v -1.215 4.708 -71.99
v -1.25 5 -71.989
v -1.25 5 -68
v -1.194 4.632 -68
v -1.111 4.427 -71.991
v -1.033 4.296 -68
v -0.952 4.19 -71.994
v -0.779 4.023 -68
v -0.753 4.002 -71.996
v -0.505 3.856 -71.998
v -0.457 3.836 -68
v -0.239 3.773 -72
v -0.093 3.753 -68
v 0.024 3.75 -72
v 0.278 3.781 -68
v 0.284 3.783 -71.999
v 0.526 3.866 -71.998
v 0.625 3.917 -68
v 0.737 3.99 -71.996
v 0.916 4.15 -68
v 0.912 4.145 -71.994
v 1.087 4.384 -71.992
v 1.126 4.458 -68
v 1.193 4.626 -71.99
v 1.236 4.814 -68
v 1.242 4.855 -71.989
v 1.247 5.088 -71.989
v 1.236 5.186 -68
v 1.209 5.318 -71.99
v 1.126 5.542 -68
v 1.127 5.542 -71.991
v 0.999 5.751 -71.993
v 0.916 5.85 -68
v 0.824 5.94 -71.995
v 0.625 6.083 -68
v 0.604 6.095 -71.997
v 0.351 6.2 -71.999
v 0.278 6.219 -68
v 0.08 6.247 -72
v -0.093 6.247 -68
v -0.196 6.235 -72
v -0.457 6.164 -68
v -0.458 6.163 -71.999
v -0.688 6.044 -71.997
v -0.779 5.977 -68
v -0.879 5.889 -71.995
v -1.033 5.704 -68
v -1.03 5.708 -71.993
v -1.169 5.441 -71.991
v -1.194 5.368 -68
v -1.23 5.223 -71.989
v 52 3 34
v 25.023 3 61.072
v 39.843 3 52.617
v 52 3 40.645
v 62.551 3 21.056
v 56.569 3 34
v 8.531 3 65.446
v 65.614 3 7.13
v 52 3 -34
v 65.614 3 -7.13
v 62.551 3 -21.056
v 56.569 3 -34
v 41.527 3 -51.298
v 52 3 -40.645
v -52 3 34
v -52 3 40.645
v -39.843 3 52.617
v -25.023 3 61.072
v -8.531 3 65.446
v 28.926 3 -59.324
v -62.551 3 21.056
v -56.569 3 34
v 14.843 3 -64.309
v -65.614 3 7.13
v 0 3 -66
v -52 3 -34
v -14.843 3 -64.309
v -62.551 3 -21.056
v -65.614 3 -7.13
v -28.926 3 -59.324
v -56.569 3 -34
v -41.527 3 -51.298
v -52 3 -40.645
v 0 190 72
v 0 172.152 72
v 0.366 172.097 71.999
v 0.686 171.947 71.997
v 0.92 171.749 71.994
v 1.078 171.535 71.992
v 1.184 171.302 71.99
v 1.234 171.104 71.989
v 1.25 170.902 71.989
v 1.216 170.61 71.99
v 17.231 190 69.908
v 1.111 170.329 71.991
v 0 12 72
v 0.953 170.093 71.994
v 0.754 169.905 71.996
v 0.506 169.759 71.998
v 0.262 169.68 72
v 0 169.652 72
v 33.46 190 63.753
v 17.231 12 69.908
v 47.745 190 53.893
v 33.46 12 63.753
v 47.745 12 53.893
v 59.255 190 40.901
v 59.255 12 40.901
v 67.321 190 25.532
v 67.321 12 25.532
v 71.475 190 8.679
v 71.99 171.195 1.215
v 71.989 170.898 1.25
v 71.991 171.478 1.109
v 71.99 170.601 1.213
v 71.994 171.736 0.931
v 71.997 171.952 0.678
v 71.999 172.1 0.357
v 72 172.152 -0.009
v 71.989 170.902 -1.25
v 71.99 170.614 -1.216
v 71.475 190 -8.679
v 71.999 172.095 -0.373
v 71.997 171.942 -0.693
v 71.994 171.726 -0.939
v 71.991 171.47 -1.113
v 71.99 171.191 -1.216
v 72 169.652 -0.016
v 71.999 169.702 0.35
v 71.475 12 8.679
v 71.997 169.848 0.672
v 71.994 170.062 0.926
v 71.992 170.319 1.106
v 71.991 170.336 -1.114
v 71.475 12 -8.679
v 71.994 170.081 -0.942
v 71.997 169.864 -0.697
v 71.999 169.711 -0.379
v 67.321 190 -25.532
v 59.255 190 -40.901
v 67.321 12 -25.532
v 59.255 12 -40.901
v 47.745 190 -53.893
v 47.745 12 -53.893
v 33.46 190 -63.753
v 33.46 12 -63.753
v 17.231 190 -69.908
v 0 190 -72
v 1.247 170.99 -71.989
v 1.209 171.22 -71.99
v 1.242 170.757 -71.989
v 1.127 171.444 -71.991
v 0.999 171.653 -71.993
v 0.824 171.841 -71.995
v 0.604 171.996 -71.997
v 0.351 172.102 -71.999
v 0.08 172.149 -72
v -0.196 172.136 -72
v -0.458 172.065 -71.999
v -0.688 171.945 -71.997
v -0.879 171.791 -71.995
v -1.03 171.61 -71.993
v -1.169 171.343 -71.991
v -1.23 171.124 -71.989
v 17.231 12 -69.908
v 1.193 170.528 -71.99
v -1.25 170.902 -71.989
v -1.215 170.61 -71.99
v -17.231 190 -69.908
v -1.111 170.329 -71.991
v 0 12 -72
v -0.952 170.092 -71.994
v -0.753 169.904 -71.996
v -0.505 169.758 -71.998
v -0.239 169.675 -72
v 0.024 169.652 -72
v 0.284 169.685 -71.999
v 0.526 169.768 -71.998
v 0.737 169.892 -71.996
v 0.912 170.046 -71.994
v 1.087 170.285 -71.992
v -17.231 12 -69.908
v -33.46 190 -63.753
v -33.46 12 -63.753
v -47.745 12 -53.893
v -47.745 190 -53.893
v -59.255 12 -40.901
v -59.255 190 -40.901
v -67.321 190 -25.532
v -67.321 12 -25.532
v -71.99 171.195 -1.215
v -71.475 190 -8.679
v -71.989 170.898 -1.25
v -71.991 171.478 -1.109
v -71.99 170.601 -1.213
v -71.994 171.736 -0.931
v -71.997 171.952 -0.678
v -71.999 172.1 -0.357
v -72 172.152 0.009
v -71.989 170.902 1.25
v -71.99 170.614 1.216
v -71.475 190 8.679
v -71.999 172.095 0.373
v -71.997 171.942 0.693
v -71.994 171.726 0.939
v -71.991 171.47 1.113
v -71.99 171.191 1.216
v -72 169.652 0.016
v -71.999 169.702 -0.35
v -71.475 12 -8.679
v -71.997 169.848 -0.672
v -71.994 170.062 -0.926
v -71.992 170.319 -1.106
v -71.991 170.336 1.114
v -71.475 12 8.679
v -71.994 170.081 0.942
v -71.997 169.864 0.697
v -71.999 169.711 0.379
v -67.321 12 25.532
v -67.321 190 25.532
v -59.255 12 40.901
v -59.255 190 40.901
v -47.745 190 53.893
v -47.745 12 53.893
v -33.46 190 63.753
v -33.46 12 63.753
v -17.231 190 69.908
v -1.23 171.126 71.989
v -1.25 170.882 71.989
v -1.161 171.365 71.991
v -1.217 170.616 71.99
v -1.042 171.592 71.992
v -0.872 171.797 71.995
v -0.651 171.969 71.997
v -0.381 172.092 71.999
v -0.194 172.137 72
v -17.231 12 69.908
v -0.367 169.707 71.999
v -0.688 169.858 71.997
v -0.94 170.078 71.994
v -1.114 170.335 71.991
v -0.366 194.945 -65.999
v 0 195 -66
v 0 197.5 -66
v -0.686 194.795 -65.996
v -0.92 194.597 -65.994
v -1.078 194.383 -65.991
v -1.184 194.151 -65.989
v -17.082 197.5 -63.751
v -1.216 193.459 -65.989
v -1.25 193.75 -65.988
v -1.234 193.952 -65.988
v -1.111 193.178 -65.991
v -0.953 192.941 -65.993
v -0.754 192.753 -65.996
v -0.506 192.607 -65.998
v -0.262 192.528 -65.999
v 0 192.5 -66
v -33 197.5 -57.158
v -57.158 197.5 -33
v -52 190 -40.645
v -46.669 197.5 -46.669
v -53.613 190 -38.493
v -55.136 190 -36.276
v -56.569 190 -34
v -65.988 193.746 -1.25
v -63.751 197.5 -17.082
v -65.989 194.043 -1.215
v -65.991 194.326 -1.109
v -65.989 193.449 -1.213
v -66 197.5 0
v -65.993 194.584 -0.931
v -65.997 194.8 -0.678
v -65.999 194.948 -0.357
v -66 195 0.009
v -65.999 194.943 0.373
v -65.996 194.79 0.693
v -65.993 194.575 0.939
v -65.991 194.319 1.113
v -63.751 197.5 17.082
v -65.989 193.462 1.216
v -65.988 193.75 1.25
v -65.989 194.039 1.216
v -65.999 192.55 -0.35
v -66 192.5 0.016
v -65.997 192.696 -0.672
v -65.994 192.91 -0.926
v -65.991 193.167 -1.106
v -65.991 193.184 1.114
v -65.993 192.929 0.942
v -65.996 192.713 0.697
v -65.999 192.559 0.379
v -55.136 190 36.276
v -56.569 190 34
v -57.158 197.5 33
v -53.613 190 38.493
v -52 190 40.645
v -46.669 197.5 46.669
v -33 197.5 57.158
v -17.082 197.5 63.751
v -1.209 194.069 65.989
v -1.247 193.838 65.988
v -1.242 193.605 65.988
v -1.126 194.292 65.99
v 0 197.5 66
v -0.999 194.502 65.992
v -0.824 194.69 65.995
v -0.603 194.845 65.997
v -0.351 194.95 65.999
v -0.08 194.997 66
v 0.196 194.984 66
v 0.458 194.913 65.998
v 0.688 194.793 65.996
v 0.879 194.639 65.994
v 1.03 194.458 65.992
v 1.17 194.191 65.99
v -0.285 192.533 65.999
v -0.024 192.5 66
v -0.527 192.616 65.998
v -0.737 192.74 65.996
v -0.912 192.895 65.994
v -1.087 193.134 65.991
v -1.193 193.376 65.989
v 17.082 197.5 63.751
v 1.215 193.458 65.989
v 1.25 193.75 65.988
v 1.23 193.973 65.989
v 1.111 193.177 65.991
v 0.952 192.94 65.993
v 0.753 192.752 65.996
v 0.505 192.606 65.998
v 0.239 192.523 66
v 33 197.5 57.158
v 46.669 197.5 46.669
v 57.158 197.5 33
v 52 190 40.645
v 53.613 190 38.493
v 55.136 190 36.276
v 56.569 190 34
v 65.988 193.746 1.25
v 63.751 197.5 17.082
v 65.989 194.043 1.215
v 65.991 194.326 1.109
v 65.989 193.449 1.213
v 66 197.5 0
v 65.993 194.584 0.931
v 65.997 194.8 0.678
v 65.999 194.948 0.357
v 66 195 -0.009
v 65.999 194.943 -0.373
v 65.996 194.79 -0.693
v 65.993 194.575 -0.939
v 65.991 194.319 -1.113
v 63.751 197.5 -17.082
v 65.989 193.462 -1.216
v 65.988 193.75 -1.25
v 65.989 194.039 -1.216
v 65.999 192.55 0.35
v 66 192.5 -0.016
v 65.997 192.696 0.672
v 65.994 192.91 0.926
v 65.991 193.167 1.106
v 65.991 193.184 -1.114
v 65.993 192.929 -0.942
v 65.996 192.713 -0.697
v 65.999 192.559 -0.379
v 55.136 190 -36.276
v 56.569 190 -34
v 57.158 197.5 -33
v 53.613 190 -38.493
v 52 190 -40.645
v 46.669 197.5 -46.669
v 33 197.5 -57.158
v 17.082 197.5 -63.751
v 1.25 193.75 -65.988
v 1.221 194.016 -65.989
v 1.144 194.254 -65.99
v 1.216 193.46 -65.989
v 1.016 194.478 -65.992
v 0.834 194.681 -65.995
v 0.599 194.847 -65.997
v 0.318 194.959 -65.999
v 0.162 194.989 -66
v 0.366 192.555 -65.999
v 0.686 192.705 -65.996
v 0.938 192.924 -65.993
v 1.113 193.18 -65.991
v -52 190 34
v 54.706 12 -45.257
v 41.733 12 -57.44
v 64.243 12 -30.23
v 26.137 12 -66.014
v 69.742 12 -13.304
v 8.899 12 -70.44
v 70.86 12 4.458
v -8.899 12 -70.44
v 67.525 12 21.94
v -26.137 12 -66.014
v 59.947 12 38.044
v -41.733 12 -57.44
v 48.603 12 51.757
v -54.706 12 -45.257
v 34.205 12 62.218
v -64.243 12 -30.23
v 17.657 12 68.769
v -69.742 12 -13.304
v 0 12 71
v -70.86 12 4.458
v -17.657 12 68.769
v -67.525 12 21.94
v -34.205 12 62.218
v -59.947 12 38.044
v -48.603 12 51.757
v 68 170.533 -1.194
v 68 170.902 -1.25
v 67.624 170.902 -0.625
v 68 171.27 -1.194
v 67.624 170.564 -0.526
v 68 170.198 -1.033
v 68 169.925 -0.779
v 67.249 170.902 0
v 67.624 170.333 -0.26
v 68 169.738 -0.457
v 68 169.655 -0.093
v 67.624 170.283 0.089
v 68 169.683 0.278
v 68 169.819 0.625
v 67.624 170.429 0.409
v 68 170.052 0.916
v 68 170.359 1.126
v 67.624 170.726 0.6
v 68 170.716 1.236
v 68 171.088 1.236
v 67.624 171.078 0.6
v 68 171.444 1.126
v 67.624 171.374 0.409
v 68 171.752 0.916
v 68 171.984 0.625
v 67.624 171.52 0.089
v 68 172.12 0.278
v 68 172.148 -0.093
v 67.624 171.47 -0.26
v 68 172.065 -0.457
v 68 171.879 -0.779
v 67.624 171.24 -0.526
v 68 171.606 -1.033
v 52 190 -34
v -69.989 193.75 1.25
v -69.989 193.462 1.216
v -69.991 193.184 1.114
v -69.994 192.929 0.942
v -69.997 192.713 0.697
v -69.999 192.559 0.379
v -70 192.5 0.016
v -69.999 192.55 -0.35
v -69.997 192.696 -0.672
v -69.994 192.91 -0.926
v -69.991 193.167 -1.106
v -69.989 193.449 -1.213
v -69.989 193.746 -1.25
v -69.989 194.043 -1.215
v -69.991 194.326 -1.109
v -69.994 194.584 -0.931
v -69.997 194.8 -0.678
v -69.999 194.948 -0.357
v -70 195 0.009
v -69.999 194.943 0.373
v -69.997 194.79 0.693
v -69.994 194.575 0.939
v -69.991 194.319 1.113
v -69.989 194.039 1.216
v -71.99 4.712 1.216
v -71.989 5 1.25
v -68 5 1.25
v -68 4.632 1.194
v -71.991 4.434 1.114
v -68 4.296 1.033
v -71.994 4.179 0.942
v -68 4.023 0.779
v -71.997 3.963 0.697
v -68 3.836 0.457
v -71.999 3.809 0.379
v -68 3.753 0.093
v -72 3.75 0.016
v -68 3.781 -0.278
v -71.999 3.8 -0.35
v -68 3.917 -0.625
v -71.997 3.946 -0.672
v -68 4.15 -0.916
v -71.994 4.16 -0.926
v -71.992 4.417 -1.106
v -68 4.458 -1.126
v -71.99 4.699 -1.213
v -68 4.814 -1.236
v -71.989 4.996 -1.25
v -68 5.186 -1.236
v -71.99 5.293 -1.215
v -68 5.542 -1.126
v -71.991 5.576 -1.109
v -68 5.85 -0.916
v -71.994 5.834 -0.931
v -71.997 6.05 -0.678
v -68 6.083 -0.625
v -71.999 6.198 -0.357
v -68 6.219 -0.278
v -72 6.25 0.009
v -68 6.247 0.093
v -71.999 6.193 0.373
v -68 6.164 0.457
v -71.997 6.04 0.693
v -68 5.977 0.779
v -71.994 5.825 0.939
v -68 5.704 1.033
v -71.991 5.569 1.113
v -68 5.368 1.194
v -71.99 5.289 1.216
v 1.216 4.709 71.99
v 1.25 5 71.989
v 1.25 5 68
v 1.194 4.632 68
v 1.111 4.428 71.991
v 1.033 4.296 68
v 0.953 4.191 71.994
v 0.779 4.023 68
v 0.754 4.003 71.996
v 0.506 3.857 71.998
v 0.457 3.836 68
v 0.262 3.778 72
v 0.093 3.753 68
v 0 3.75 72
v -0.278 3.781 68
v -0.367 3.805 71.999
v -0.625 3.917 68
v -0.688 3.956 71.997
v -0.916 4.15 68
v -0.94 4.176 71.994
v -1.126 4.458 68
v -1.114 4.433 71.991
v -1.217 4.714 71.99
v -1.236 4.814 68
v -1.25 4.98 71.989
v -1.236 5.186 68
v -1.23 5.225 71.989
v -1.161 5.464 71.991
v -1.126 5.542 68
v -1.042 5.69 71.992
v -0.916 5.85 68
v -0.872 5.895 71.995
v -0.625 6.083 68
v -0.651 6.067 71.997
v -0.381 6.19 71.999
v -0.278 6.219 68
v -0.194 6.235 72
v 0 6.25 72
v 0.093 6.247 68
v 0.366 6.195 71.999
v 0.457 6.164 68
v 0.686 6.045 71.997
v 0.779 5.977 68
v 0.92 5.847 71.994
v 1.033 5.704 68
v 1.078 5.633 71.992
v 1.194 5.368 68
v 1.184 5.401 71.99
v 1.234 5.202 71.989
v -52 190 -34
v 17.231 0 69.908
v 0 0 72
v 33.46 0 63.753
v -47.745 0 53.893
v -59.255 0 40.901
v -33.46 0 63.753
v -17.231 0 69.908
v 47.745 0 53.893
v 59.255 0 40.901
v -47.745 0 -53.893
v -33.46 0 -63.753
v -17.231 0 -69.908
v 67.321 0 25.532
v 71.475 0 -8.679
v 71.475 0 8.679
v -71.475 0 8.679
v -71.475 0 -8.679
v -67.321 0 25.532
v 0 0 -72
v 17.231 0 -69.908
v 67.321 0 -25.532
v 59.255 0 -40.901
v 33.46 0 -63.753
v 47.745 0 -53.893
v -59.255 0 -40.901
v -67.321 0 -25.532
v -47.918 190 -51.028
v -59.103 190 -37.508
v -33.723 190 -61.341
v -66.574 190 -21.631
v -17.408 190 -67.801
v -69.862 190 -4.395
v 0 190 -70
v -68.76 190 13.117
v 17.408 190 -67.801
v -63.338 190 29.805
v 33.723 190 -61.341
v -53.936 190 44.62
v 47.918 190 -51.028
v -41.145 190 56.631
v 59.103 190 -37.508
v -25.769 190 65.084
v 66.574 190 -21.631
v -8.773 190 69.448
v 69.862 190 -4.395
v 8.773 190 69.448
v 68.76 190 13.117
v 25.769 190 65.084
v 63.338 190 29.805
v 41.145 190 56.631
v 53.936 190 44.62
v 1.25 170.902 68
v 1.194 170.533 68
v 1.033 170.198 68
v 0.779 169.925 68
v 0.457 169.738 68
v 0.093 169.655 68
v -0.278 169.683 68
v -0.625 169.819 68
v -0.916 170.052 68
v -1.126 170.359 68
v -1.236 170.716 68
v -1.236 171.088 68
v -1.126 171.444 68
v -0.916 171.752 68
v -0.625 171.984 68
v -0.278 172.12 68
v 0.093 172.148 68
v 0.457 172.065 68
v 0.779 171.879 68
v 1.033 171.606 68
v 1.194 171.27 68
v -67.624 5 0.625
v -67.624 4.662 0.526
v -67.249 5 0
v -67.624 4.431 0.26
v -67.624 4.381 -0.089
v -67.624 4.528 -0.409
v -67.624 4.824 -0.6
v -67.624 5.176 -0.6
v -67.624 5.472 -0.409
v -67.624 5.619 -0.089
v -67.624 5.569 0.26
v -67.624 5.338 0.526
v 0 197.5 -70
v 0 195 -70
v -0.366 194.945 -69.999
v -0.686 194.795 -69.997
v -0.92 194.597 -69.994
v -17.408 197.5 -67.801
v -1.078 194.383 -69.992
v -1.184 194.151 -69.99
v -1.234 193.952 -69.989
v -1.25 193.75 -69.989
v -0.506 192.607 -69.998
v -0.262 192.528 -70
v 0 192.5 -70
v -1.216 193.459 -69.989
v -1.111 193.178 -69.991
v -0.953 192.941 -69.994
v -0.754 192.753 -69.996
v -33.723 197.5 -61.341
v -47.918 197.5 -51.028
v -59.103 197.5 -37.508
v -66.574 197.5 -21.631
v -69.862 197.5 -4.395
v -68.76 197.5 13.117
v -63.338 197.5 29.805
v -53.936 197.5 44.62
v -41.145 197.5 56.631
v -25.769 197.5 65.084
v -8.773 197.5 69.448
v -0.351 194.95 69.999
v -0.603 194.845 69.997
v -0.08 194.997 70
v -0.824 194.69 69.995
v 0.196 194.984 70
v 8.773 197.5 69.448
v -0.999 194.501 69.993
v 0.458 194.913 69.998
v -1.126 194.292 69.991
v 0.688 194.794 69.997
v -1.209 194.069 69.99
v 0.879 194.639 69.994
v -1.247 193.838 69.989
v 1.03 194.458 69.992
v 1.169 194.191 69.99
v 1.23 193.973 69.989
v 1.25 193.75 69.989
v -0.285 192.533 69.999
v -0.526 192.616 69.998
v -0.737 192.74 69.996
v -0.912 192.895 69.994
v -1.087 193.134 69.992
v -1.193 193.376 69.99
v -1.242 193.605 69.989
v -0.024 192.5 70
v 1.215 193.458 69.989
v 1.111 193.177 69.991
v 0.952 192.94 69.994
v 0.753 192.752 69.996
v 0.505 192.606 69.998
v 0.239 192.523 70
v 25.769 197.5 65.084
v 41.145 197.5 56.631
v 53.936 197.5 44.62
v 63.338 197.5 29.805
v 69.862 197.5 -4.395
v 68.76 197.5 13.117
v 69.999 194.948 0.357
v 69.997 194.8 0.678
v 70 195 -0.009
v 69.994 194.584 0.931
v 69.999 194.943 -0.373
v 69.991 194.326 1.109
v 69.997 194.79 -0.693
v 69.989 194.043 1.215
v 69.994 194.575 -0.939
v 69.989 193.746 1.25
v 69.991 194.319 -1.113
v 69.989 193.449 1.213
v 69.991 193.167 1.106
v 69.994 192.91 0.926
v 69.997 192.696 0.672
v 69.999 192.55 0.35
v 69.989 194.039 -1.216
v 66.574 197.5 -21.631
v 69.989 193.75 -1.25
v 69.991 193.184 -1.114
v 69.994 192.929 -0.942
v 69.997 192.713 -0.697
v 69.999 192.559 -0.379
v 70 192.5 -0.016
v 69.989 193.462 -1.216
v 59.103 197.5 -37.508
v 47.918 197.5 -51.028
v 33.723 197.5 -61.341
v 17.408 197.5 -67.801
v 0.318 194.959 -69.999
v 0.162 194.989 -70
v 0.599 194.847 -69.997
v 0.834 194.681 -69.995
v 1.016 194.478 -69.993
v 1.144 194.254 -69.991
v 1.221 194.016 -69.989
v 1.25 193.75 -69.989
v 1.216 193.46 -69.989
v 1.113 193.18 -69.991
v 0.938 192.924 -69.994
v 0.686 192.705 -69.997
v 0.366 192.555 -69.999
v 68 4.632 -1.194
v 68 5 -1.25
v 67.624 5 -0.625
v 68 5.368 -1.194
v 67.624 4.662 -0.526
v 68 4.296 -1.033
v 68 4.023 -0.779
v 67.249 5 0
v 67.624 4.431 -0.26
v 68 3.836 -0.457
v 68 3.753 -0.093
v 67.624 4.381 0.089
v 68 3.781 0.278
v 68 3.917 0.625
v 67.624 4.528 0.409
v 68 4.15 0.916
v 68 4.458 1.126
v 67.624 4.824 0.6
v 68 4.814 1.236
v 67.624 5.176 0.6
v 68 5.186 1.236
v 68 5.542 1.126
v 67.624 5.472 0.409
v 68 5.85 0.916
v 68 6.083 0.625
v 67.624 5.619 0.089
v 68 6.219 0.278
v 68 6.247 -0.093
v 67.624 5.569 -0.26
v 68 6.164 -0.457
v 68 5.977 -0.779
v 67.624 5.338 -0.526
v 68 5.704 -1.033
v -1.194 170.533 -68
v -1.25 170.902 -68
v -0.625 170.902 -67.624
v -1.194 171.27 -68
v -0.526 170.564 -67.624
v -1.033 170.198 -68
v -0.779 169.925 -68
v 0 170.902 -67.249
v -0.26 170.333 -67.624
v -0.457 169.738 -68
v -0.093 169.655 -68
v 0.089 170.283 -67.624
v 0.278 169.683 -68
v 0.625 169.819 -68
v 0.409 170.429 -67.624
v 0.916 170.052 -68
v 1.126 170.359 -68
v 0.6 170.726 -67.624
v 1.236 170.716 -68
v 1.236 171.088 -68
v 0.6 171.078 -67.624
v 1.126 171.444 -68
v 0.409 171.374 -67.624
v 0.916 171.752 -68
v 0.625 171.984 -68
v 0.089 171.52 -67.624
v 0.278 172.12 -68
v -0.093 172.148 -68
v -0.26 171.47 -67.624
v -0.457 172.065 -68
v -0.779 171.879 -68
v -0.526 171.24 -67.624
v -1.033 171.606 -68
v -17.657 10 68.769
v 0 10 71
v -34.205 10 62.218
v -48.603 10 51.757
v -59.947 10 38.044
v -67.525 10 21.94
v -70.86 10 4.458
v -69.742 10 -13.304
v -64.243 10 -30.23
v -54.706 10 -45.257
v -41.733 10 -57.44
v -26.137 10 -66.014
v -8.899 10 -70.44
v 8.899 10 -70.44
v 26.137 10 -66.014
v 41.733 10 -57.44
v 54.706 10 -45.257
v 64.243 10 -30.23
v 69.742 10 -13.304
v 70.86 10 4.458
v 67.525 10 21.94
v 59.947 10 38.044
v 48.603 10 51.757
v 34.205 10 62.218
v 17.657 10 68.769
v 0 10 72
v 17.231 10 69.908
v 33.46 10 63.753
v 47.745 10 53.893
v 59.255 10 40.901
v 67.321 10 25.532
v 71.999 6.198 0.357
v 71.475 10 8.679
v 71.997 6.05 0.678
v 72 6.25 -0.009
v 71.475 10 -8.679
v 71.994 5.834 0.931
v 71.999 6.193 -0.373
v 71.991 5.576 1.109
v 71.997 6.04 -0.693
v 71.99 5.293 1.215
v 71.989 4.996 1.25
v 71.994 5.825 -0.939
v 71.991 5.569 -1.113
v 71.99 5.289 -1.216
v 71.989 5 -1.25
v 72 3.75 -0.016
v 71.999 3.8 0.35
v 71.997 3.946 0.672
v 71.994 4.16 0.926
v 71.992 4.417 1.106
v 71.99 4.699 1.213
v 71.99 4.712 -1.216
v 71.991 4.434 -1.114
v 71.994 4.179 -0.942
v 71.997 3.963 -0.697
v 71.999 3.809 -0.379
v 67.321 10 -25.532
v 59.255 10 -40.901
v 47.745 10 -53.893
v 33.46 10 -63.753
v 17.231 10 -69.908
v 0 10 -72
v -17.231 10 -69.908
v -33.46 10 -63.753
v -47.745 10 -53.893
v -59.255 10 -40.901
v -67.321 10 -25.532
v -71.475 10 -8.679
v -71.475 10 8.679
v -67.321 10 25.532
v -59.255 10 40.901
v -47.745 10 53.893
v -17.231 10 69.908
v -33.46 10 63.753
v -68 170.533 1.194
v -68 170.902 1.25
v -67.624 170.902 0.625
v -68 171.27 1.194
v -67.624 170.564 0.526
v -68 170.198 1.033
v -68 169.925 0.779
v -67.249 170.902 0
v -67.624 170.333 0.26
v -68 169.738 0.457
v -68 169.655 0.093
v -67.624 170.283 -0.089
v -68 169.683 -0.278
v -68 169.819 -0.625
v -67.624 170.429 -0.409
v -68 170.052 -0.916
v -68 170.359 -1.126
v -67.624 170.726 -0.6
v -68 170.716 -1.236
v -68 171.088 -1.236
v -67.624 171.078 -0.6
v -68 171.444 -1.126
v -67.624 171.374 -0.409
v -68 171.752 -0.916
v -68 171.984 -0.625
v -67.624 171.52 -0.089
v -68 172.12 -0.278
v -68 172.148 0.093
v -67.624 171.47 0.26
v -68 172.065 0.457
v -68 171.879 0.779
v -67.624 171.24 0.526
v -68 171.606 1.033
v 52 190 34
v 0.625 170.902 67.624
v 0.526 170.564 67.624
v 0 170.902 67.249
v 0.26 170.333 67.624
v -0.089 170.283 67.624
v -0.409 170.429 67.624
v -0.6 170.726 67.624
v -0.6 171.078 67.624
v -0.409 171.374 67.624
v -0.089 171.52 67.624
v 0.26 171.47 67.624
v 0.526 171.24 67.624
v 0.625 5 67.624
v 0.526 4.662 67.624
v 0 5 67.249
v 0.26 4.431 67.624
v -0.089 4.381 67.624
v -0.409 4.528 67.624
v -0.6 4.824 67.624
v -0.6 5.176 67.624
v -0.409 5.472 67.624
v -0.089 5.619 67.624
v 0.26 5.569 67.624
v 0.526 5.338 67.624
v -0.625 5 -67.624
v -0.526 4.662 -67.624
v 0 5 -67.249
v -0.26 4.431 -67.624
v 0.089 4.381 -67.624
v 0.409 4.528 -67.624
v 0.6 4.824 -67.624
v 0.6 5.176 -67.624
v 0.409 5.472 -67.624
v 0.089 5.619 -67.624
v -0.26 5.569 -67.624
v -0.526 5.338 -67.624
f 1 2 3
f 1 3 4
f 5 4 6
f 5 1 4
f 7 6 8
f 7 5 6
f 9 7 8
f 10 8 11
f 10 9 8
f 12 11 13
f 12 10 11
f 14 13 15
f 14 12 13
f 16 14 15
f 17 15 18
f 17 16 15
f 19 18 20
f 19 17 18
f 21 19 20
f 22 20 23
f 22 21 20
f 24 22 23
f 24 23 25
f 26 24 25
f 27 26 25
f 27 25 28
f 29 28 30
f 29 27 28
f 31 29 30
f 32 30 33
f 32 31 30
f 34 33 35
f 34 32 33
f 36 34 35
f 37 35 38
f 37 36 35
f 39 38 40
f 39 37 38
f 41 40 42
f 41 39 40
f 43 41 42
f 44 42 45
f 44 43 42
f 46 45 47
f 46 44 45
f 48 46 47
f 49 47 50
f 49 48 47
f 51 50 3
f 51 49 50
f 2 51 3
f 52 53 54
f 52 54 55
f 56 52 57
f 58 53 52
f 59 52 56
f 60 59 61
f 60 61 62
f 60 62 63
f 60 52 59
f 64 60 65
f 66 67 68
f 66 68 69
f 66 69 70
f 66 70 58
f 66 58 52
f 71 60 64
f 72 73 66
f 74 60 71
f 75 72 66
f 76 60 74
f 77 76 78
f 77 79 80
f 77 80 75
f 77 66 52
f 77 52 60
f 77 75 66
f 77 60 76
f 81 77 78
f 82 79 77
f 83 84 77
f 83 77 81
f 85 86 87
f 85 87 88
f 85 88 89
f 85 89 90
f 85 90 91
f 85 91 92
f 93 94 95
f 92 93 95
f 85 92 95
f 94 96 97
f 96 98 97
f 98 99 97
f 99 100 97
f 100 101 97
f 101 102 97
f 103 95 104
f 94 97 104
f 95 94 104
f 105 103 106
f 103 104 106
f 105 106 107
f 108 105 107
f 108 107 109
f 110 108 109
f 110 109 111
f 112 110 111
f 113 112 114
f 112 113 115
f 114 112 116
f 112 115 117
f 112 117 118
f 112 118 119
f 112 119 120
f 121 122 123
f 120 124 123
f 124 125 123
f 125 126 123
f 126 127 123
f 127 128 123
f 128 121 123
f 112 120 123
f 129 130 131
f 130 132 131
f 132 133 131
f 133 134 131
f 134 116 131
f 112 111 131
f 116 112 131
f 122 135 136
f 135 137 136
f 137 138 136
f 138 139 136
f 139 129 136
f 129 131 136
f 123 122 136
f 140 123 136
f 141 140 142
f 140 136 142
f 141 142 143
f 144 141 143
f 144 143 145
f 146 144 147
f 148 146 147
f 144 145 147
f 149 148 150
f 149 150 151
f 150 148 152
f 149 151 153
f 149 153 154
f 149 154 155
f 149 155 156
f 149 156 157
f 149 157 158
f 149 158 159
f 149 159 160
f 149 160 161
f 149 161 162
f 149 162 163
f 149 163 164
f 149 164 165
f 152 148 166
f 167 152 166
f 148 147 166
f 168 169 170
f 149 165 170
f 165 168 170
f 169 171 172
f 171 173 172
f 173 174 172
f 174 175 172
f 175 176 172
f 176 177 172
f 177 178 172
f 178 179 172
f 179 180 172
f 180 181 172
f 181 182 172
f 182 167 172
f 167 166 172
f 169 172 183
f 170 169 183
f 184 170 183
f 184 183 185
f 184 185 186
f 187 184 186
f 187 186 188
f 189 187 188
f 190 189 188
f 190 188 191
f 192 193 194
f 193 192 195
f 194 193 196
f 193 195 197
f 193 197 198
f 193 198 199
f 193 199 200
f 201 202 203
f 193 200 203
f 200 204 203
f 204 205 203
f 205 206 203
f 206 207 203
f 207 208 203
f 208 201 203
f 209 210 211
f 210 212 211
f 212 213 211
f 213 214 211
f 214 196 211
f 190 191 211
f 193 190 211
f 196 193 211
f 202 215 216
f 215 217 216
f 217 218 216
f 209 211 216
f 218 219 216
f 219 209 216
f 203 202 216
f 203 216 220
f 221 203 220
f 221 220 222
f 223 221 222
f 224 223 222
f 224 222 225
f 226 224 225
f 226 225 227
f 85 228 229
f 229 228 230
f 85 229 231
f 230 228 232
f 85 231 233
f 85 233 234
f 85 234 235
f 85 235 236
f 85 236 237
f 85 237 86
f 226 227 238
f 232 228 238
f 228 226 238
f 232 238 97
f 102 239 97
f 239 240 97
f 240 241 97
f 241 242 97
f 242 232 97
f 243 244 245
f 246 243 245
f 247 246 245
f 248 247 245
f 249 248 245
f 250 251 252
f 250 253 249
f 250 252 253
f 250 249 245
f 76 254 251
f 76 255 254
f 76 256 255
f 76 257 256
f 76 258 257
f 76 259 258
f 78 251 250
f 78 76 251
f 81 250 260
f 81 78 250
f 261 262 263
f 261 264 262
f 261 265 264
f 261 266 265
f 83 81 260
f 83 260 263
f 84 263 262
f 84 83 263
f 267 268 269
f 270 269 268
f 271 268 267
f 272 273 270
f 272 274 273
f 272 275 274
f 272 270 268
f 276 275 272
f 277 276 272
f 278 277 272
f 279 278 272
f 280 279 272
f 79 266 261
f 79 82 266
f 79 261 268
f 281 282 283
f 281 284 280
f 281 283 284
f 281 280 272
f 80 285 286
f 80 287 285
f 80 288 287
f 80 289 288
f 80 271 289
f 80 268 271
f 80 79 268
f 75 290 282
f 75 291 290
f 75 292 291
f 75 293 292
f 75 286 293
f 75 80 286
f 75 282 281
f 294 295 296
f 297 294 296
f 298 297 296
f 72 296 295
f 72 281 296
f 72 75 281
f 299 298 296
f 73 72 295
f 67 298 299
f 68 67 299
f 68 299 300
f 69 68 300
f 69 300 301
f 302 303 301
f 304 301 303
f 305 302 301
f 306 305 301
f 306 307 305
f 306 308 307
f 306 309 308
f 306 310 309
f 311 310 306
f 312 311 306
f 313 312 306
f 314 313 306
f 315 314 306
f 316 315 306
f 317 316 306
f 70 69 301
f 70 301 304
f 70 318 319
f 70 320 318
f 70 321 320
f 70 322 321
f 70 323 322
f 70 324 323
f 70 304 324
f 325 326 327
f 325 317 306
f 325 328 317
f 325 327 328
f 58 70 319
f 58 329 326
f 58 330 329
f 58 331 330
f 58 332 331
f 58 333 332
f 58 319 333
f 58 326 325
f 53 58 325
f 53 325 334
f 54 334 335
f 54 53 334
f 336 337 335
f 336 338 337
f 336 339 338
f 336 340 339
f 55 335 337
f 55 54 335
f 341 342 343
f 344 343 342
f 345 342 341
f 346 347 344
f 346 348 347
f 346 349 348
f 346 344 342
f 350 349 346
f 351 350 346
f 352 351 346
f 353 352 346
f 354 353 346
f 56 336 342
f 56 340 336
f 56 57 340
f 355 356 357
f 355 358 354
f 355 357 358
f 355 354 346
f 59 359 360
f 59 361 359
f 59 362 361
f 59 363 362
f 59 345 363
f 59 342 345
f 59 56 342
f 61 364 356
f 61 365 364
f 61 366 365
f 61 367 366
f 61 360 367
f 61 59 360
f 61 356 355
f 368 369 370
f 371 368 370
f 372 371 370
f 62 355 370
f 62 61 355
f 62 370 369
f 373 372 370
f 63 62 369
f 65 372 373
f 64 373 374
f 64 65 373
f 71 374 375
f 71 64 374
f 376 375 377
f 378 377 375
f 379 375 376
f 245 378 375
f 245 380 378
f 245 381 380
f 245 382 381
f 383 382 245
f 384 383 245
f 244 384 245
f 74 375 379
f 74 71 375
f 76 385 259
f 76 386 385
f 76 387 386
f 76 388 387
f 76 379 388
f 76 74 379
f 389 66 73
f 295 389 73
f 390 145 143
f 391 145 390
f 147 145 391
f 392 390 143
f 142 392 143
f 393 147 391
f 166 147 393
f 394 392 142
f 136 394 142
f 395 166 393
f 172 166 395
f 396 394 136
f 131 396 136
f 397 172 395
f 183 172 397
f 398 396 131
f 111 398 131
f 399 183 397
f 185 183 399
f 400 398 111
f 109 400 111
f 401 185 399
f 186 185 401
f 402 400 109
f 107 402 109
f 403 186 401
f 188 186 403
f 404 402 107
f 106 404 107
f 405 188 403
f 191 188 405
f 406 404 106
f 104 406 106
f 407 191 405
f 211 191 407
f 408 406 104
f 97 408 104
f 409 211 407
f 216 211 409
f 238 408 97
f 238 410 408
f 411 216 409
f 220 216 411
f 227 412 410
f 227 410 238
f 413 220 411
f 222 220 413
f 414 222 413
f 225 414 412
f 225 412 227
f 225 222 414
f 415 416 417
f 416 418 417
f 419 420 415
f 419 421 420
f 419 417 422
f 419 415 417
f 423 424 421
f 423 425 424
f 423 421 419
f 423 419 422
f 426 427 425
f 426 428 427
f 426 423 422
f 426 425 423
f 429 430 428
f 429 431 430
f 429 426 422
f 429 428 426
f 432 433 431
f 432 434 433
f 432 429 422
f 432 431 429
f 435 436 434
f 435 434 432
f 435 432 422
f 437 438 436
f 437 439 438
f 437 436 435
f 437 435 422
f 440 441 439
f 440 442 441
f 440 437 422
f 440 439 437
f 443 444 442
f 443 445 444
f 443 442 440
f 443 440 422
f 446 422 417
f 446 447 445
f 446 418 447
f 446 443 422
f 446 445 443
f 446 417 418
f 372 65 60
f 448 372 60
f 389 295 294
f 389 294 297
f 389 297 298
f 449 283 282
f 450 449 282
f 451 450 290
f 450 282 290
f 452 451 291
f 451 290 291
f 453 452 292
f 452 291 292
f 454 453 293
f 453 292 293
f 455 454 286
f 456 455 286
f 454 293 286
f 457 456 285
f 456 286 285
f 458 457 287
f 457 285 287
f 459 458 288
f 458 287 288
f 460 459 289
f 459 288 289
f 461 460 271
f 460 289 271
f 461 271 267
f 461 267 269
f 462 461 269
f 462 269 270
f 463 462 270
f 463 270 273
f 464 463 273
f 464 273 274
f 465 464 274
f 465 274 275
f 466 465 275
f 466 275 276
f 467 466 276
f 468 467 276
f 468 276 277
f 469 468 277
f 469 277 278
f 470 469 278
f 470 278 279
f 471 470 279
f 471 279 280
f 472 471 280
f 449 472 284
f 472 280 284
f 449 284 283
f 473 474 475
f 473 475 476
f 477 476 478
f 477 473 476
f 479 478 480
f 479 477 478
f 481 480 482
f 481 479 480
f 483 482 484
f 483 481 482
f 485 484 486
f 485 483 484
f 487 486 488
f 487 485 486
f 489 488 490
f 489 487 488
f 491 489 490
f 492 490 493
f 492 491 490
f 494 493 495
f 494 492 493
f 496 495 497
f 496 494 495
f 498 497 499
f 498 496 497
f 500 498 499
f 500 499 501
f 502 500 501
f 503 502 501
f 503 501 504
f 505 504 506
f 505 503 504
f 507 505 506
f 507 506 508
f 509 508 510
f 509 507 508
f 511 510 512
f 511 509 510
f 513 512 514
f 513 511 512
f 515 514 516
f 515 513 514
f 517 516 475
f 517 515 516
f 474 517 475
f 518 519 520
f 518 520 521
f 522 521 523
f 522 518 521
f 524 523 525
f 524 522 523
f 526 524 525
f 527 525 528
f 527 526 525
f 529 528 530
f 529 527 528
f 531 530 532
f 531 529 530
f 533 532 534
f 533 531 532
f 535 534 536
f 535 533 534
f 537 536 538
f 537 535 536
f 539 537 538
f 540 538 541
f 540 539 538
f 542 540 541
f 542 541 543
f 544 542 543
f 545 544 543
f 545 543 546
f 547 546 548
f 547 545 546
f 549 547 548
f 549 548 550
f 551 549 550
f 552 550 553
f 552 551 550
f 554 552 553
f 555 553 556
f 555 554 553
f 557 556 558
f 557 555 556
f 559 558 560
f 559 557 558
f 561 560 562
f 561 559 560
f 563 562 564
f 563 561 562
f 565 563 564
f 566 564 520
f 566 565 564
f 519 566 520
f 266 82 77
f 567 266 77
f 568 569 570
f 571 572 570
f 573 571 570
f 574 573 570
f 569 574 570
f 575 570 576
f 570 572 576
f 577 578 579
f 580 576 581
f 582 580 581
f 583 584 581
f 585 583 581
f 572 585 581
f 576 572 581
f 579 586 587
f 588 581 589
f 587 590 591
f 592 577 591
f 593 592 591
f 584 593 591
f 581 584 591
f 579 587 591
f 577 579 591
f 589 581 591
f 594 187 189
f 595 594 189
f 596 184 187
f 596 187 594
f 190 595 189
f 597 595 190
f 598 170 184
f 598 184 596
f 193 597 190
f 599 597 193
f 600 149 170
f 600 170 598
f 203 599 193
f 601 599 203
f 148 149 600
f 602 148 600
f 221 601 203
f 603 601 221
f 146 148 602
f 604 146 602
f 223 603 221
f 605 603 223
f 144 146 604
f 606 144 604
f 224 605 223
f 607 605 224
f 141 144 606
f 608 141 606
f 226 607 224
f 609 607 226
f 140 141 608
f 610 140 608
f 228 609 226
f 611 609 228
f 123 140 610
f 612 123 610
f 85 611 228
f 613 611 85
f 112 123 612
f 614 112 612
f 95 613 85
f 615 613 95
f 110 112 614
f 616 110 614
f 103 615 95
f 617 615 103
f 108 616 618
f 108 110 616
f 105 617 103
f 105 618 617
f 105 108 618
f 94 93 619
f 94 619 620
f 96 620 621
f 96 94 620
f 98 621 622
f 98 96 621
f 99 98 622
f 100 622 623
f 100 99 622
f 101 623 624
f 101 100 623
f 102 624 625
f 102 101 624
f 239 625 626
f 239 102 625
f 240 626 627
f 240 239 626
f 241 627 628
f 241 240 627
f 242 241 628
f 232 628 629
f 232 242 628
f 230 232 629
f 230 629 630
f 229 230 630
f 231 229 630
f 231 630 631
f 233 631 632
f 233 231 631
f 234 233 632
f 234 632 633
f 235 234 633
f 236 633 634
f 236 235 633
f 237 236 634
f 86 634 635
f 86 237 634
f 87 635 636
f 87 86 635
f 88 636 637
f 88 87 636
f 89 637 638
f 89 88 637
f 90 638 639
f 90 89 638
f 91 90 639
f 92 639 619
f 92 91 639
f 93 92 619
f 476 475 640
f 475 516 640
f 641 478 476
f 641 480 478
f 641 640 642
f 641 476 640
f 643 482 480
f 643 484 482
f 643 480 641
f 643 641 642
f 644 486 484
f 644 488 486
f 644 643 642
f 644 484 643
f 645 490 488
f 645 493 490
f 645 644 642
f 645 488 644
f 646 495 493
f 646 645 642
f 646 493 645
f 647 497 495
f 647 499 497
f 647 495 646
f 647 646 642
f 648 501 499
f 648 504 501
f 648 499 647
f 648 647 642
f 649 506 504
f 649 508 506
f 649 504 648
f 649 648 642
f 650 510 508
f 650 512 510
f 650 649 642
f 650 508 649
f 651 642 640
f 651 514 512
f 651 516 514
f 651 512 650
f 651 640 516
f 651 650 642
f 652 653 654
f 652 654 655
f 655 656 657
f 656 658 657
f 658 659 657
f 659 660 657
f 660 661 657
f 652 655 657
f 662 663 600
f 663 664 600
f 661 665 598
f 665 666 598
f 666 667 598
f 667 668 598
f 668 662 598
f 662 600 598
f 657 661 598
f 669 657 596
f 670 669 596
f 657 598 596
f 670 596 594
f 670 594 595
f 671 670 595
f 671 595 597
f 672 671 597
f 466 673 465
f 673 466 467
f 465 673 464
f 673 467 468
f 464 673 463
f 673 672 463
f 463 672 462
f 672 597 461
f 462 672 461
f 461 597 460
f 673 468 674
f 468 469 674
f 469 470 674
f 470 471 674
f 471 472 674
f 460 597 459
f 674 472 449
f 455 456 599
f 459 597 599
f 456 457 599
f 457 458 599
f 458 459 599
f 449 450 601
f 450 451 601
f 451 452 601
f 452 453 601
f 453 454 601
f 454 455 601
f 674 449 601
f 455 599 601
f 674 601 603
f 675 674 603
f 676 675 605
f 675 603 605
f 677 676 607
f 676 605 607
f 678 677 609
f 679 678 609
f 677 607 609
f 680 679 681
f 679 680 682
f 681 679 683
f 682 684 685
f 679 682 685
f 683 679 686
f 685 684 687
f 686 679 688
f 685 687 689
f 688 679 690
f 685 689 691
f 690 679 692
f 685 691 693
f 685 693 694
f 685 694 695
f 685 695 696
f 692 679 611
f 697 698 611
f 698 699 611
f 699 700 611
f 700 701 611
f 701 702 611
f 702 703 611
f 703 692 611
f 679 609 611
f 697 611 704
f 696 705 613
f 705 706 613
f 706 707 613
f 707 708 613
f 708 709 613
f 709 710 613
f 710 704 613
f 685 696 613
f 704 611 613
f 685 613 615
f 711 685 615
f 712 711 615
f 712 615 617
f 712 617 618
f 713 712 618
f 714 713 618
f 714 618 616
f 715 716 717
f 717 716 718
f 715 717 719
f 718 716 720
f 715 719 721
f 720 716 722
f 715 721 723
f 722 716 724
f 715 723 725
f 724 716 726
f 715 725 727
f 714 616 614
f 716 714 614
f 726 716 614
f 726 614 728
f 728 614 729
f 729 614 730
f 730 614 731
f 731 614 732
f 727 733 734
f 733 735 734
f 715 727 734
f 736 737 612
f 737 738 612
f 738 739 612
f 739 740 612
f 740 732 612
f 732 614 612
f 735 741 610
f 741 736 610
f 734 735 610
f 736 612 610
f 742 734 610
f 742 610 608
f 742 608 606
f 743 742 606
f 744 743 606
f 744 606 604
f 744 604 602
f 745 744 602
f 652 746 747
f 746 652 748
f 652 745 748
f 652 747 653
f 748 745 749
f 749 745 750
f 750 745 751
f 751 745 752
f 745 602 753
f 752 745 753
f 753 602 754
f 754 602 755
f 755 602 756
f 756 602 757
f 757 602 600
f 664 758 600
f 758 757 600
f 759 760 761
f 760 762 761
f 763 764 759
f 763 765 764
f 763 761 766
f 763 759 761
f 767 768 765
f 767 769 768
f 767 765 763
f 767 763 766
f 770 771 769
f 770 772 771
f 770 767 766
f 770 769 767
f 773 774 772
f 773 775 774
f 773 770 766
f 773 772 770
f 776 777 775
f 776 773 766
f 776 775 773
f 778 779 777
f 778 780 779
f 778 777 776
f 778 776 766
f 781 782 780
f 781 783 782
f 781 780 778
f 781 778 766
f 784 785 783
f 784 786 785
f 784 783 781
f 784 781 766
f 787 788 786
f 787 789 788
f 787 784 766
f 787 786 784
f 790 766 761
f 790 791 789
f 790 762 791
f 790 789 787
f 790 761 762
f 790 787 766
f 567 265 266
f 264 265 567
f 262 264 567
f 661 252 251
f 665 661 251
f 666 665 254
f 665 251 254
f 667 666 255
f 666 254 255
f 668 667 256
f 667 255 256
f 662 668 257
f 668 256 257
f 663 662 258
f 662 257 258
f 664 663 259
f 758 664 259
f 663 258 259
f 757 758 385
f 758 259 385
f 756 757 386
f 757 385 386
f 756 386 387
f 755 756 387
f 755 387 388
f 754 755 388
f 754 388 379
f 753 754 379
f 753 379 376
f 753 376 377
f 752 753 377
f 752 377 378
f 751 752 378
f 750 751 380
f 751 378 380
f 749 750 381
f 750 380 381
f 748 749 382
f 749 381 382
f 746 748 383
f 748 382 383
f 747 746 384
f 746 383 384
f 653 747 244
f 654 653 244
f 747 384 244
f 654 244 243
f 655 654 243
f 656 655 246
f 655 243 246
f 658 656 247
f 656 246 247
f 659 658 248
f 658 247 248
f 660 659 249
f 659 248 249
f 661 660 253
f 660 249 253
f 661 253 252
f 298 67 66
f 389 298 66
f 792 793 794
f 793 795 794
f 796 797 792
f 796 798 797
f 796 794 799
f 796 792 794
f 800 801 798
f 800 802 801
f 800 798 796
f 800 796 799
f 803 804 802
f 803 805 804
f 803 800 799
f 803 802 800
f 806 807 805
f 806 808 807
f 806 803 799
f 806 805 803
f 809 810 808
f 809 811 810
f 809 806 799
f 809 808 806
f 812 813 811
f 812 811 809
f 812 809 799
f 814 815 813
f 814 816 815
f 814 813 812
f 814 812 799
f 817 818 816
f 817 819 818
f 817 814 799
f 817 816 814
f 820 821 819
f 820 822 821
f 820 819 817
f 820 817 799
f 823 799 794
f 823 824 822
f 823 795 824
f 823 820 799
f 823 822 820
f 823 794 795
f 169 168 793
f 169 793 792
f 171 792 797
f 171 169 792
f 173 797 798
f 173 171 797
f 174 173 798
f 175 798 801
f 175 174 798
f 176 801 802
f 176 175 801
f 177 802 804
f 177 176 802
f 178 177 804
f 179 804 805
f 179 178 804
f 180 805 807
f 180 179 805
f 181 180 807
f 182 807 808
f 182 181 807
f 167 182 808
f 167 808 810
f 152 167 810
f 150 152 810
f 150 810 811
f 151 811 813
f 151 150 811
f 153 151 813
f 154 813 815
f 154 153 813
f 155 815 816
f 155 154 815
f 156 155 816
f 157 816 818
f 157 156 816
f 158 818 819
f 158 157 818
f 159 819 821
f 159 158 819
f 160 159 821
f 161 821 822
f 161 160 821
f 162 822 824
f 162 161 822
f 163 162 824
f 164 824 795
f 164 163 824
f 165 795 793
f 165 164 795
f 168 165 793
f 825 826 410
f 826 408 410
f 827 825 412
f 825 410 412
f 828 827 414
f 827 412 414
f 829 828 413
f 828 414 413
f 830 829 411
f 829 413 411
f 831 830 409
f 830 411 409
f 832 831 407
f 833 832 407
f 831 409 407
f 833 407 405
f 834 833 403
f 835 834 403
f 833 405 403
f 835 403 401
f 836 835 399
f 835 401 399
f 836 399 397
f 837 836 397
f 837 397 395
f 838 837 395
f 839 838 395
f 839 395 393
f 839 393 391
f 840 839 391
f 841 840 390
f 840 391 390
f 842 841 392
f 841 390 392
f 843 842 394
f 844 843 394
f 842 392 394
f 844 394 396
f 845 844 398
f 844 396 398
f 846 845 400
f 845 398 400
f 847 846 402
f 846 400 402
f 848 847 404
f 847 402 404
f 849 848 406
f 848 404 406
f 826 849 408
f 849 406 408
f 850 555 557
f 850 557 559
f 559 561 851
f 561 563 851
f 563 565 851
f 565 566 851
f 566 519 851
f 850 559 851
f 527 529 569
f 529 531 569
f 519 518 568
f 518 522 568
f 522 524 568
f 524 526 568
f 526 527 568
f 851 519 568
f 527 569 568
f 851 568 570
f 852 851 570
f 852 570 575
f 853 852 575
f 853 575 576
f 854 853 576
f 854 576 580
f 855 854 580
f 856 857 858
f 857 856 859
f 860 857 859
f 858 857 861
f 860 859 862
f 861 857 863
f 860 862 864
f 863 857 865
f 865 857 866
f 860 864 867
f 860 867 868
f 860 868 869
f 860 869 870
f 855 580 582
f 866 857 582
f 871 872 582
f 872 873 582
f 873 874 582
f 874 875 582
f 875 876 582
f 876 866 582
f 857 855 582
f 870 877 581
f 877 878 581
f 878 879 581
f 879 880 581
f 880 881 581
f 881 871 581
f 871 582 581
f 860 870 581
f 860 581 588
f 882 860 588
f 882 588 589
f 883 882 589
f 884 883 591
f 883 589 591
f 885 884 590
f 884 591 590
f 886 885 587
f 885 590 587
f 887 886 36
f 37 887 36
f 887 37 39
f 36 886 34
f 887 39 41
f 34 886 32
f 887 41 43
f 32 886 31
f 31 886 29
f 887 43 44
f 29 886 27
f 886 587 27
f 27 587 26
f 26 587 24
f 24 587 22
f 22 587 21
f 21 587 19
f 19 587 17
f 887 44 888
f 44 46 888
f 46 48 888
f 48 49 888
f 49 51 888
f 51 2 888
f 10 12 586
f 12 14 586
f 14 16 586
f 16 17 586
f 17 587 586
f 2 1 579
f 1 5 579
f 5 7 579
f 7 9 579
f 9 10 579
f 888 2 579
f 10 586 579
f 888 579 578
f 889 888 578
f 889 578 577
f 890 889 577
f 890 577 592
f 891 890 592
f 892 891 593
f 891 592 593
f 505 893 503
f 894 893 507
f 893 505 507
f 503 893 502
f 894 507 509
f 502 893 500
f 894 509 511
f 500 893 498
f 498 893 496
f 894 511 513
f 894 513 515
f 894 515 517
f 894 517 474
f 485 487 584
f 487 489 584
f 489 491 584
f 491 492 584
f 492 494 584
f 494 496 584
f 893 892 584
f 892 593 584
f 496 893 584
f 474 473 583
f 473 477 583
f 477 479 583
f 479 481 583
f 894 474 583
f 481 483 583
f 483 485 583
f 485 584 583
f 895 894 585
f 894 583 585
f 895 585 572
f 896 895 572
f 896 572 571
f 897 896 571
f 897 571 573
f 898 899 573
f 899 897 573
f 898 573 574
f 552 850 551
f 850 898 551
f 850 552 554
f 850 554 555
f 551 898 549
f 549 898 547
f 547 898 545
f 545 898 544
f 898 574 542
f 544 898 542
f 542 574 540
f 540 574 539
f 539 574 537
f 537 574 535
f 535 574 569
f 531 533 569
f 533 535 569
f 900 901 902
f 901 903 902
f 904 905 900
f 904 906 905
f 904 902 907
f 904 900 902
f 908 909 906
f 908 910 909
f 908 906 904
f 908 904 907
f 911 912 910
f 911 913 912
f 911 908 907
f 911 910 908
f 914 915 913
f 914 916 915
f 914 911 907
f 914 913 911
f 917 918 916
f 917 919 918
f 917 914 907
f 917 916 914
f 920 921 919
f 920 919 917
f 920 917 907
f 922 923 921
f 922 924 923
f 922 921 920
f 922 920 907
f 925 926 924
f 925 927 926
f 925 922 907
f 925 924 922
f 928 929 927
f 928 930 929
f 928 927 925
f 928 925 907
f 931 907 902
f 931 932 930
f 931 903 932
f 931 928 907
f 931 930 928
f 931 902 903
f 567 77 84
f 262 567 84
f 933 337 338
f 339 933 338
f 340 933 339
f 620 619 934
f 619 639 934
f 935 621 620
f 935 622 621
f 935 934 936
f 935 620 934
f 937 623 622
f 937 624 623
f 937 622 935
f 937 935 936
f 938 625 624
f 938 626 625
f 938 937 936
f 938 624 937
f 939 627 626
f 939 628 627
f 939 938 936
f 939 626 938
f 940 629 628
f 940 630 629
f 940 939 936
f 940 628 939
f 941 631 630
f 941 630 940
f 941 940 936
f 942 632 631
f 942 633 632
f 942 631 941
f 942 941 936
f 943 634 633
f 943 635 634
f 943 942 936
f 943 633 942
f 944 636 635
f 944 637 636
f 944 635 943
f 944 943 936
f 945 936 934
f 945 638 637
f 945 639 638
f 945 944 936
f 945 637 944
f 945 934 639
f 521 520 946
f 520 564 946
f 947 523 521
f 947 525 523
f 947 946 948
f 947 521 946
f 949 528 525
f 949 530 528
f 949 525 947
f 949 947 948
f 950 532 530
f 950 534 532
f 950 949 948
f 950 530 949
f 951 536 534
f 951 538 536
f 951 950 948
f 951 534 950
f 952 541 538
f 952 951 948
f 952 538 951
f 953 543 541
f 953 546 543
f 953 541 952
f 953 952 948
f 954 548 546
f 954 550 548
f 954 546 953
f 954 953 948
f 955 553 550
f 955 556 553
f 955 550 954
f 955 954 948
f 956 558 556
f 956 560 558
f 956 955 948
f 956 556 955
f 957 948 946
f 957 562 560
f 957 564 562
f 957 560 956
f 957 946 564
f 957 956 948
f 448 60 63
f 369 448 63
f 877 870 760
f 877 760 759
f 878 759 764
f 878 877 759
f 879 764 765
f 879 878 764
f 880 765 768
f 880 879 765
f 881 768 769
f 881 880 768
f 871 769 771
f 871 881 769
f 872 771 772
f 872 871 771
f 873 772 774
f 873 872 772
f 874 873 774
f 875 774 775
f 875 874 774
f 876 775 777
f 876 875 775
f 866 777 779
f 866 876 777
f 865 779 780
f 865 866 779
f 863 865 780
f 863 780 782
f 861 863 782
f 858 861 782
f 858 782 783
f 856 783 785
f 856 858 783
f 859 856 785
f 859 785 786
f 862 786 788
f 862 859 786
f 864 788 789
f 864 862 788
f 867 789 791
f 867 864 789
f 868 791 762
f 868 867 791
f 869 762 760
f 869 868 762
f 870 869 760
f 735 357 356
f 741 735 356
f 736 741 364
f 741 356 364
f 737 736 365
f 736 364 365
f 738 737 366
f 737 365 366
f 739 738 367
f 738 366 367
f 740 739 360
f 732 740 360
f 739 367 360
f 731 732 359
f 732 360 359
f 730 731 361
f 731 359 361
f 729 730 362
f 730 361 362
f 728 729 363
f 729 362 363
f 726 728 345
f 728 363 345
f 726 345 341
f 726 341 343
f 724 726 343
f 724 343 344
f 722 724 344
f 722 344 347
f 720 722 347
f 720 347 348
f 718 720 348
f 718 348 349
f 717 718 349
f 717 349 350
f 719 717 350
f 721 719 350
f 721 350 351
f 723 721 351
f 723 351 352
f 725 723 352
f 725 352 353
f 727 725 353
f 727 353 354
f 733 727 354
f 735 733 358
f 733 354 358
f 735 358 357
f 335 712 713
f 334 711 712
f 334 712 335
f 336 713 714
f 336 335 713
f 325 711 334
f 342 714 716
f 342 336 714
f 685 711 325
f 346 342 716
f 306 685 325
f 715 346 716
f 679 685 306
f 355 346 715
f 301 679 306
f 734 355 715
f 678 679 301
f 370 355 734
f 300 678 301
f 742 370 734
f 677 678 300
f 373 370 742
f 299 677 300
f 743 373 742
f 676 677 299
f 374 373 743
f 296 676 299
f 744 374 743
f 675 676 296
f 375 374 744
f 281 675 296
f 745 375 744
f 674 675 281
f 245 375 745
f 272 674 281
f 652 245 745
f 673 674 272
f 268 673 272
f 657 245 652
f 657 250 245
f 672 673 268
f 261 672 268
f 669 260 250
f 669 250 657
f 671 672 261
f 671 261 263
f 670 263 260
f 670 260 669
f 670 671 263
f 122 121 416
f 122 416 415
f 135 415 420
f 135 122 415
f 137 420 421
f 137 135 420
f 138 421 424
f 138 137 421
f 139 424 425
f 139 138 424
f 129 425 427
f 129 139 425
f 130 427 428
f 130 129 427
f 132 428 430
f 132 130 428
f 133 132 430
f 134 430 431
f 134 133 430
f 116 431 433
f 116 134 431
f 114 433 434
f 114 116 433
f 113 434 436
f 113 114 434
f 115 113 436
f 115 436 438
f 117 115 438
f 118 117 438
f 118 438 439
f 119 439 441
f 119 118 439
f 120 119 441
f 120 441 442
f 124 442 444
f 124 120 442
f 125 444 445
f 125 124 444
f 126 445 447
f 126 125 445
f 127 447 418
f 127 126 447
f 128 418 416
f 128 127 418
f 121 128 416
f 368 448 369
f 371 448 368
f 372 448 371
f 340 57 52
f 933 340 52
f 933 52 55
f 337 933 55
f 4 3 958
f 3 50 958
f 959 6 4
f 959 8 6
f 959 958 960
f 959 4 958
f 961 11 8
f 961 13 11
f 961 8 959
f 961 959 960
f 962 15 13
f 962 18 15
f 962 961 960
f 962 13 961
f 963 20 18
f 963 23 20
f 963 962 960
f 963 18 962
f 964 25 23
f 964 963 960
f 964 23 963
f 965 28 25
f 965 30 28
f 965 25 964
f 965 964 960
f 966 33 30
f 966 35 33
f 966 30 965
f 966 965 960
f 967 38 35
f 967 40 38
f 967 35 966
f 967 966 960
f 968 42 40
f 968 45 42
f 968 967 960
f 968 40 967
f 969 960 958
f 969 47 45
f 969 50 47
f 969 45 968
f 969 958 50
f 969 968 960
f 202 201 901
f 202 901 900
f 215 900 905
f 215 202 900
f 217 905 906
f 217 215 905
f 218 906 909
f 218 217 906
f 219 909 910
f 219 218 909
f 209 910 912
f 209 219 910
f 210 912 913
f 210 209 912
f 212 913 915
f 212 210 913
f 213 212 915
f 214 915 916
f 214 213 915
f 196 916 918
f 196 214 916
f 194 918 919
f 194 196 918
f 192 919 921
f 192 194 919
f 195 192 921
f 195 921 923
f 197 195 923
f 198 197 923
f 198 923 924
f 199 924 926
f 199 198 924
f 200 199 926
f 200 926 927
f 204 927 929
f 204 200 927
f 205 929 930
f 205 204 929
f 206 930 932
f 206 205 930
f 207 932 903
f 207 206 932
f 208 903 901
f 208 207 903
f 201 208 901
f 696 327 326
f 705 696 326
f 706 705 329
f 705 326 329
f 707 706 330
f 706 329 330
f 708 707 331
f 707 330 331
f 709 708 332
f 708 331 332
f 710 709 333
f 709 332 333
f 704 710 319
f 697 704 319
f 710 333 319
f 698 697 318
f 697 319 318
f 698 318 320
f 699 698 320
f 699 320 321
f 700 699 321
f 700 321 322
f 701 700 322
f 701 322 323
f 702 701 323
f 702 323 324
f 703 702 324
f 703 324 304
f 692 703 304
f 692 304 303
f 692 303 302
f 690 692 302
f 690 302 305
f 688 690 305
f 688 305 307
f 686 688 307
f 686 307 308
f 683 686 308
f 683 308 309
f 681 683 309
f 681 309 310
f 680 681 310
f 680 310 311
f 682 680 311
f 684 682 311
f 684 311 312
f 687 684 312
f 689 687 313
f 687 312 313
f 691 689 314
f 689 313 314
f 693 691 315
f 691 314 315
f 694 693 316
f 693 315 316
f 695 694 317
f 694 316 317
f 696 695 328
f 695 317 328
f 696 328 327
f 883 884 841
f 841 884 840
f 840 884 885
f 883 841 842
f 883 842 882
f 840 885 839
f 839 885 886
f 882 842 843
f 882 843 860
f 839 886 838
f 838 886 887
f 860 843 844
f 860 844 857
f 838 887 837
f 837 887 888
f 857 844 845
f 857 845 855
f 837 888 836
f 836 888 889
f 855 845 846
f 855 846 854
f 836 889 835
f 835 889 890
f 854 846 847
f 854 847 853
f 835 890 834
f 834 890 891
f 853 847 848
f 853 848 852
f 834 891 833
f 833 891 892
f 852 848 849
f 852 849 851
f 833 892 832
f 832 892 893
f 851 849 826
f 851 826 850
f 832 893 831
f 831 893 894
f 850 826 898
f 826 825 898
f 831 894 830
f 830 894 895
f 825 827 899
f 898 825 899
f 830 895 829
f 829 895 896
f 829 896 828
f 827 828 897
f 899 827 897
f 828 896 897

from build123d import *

# Parameters (mm, degrees)
SKETCH_6_R               = 72
SKETCH_6_R_2             = 70
EXTRUDE_1_DEPTH          = 190
SKETCH_6_15_R            = 70
SKETCH_6_15_R_2          = 66
EXTRUDE_2_DEPTH          = 197.5
SKETCH_6_16_R            = 66
EXTRUDE_3_DEPTH          = 3
EXTRUDE_6_DEPTH          = 190
F_2_5MM_3_D              = 2.5
F_2_5MM_3_DEPTH          = 70
PATTERN_CIRCULAR_1_COUNT = 4
SKETCH_33_W              = 1
SKETCH_33_H              = 2
PATTERN_CIRCULAR_2_COUNT = 4
PATTERN_CIRCULAR_3_COUNT = 4


with BuildPart() as part:
    # 草圖6 → 填料-伸長1 (new body)
    with BuildSketch(Plane(origin=(0, 0, 0), x_dir=(1, 0, 0), z_dir=(0, 1, 0))):
        with Locations(Location((0, 0, 0), (0, 0, 270))):
            Circle(SKETCH_6_R)
        with Locations(Location((0, 0, 0), (0, 0, 270))):
            Circle(SKETCH_6_R_2, mode=Mode.SUBTRACT)
    extrude(amount=EXTRUDE_1_DEPTH)

    # 草圖6<15> → 填料-伸長2 (add)
    with BuildSketch(Plane(origin=(0, 0, 0), x_dir=(1, 0, 0), z_dir=(0, 1, 0))):
        with Locations(Location((0, 0, 0), (0, 0, 90))):
            Circle(SKETCH_6_15_R)
        with Locations(Location((0, 0, 0), (0, 0, 90))):
            Circle(SKETCH_6_15_R_2, mode=Mode.SUBTRACT)
    extrude(amount=EXTRUDE_2_DEPTH)

    # 草圖6<16> → 填料-伸長3 (add)
    with BuildSketch(Plane(origin=(0, 0, 0), x_dir=(1, 0, 0), z_dir=(0, 1, 0))):
        with Locations(Location((0, 0, 0), (0, 0, 90))):
            Circle(SKETCH_6_16_R)
    extrude(amount=EXTRUDE_3_DEPTH)

    # 草圖9 → 填料-伸長6 (add)
    with BuildSketch(Plane(origin=(0, 0, 0), x_dir=(1, 0, 0), z_dir=(0, 1, 0))):
        with BuildLine():
            Line((-52, 34), (-52, 40.644802866))
            ThreePointArc((-52, 40.644802866), (-54.38584794, 37.392239086), (-56.568542495, 34))
            Line((-56.568542495, 34), (-52, 34))
        make_face()
        with BuildLine():
            Line((-52, -34), (-56.568542495, -34))
            ThreePointArc((-56.568542495, -34), (-54.38584794, -37.392239086), (-52, -40.644802866))
            Line((-52, -40.644802866), (-52, -34))
        make_face()
        with BuildLine():
            Line((56.568542495, -34), (52, -34))
            Line((52, -34), (52, -40.644802866))
            ThreePointArc((52, -40.644802866), (54.38584794, -37.392239086), (56.568542495, -34))
        make_face()
        with BuildLine():
            ThreePointArc((56.568542495, 34), (54.38584794, 37.392239086), (52, 40.644802866))
            Line((52, 40.644802866), (52, 34))
            Line((52, 34), (56.568542495, 34))
        make_face()
    extrude(amount=EXTRUDE_6_DEPTH)

    # Ø2.5mm 定位孔3
    with Locations(Plane(origin=(70, 193.75, 0), x_dir=(0, 0, 1), z_dir=(1, 0, 0))):
        with Locations((0, 0)):
            f_2_5mm_3 = Hole(F_2_5MM_3_D / 2, depth=F_2_5MM_3_DEPTH)

    # 環狀複製排列1: Ø2.5mm 定位孔3 ×4 about axis
    pattern_circular_1_axis = Axis((0, 197.5, 0), (0, 1, 0))
    for i in range(1, PATTERN_CIRCULAR_1_COUNT):
        add(f_2_5mm_3.rotate(pattern_circular_1_axis, i * 360 / PATTERN_CIRCULAR_1_COUNT), mode=Mode.SUBTRACT)

    # 草圖33 → 除料-旋轉1 (revolve, cut)
    with BuildSketch(Plane.XY, mode=Mode.PRIVATE) as cut_revolve_1_sk:
        with Locations((-71.5, 11)):
            Rectangle(SKETCH_33_W, SKETCH_33_H)
    revolve(cut_revolve_1_sk.sketch.rotate(Axis((0, 197.5, 0), (0, -1, 0)), 270), axis=Axis((0, 197.5, 0), (0, -1, 0)), mode=Mode.SUBTRACT)

    # 草圖37 → Ø2.5mm 定位孔4 (revolve, cut)
    with BuildSketch(Plane(origin=(-72, 5, 0), x_dir=(0, 0, 1), z_dir=(0, 1, 0))):
        Polygon((0, 0), (0, 4.751075774), (1.25, 4), (1.25, 0), align=None)
    f_2_5mm_4 = revolve(axis=Axis((-78.35, 5, 0), (1, 0, 0)), mode=Mode.SUBTRACT)

    # 環狀複製排列2: Ø2.5mm 定位孔4 ×4 about axis
    pattern_circular_2_axis = Axis((0, 197.5, 0), (0, -1, 0))
    for i in range(1, PATTERN_CIRCULAR_2_COUNT):
        add(f_2_5mm_4.rotate(pattern_circular_2_axis, i * 360 / PATTERN_CIRCULAR_2_COUNT), mode=Mode.SUBTRACT)

    # 草圖38 → Ø2.5mm 定位孔5 (revolve, cut)
    with BuildSketch(Plane(origin=(-72, 170.901826282, 0), x_dir=(0, 0, 1), z_dir=(0, 1, 0))):
        Polygon((0, 0), (0, 4.751075774), (1.25, 4), (1.25, 0), align=None)
    f_2_5mm_5 = revolve(axis=Axis((-78.35, 170.901826282, 0), (1, 0, 0)), mode=Mode.SUBTRACT)

    # 環狀複製排列3: Ø2.5mm 定位孔5 ×4 about axis
    pattern_circular_3_axis = Axis((0, 197.5, 0), (0, -1, 0))
    for i in range(1, PATTERN_CIRCULAR_3_COUNT):
        add(f_2_5mm_5.rotate(pattern_circular_3_axis, i * 360 / PATTERN_CIRCULAR_3_COUNT), mode=Mode.SUBTRACT)


solid = part.part
